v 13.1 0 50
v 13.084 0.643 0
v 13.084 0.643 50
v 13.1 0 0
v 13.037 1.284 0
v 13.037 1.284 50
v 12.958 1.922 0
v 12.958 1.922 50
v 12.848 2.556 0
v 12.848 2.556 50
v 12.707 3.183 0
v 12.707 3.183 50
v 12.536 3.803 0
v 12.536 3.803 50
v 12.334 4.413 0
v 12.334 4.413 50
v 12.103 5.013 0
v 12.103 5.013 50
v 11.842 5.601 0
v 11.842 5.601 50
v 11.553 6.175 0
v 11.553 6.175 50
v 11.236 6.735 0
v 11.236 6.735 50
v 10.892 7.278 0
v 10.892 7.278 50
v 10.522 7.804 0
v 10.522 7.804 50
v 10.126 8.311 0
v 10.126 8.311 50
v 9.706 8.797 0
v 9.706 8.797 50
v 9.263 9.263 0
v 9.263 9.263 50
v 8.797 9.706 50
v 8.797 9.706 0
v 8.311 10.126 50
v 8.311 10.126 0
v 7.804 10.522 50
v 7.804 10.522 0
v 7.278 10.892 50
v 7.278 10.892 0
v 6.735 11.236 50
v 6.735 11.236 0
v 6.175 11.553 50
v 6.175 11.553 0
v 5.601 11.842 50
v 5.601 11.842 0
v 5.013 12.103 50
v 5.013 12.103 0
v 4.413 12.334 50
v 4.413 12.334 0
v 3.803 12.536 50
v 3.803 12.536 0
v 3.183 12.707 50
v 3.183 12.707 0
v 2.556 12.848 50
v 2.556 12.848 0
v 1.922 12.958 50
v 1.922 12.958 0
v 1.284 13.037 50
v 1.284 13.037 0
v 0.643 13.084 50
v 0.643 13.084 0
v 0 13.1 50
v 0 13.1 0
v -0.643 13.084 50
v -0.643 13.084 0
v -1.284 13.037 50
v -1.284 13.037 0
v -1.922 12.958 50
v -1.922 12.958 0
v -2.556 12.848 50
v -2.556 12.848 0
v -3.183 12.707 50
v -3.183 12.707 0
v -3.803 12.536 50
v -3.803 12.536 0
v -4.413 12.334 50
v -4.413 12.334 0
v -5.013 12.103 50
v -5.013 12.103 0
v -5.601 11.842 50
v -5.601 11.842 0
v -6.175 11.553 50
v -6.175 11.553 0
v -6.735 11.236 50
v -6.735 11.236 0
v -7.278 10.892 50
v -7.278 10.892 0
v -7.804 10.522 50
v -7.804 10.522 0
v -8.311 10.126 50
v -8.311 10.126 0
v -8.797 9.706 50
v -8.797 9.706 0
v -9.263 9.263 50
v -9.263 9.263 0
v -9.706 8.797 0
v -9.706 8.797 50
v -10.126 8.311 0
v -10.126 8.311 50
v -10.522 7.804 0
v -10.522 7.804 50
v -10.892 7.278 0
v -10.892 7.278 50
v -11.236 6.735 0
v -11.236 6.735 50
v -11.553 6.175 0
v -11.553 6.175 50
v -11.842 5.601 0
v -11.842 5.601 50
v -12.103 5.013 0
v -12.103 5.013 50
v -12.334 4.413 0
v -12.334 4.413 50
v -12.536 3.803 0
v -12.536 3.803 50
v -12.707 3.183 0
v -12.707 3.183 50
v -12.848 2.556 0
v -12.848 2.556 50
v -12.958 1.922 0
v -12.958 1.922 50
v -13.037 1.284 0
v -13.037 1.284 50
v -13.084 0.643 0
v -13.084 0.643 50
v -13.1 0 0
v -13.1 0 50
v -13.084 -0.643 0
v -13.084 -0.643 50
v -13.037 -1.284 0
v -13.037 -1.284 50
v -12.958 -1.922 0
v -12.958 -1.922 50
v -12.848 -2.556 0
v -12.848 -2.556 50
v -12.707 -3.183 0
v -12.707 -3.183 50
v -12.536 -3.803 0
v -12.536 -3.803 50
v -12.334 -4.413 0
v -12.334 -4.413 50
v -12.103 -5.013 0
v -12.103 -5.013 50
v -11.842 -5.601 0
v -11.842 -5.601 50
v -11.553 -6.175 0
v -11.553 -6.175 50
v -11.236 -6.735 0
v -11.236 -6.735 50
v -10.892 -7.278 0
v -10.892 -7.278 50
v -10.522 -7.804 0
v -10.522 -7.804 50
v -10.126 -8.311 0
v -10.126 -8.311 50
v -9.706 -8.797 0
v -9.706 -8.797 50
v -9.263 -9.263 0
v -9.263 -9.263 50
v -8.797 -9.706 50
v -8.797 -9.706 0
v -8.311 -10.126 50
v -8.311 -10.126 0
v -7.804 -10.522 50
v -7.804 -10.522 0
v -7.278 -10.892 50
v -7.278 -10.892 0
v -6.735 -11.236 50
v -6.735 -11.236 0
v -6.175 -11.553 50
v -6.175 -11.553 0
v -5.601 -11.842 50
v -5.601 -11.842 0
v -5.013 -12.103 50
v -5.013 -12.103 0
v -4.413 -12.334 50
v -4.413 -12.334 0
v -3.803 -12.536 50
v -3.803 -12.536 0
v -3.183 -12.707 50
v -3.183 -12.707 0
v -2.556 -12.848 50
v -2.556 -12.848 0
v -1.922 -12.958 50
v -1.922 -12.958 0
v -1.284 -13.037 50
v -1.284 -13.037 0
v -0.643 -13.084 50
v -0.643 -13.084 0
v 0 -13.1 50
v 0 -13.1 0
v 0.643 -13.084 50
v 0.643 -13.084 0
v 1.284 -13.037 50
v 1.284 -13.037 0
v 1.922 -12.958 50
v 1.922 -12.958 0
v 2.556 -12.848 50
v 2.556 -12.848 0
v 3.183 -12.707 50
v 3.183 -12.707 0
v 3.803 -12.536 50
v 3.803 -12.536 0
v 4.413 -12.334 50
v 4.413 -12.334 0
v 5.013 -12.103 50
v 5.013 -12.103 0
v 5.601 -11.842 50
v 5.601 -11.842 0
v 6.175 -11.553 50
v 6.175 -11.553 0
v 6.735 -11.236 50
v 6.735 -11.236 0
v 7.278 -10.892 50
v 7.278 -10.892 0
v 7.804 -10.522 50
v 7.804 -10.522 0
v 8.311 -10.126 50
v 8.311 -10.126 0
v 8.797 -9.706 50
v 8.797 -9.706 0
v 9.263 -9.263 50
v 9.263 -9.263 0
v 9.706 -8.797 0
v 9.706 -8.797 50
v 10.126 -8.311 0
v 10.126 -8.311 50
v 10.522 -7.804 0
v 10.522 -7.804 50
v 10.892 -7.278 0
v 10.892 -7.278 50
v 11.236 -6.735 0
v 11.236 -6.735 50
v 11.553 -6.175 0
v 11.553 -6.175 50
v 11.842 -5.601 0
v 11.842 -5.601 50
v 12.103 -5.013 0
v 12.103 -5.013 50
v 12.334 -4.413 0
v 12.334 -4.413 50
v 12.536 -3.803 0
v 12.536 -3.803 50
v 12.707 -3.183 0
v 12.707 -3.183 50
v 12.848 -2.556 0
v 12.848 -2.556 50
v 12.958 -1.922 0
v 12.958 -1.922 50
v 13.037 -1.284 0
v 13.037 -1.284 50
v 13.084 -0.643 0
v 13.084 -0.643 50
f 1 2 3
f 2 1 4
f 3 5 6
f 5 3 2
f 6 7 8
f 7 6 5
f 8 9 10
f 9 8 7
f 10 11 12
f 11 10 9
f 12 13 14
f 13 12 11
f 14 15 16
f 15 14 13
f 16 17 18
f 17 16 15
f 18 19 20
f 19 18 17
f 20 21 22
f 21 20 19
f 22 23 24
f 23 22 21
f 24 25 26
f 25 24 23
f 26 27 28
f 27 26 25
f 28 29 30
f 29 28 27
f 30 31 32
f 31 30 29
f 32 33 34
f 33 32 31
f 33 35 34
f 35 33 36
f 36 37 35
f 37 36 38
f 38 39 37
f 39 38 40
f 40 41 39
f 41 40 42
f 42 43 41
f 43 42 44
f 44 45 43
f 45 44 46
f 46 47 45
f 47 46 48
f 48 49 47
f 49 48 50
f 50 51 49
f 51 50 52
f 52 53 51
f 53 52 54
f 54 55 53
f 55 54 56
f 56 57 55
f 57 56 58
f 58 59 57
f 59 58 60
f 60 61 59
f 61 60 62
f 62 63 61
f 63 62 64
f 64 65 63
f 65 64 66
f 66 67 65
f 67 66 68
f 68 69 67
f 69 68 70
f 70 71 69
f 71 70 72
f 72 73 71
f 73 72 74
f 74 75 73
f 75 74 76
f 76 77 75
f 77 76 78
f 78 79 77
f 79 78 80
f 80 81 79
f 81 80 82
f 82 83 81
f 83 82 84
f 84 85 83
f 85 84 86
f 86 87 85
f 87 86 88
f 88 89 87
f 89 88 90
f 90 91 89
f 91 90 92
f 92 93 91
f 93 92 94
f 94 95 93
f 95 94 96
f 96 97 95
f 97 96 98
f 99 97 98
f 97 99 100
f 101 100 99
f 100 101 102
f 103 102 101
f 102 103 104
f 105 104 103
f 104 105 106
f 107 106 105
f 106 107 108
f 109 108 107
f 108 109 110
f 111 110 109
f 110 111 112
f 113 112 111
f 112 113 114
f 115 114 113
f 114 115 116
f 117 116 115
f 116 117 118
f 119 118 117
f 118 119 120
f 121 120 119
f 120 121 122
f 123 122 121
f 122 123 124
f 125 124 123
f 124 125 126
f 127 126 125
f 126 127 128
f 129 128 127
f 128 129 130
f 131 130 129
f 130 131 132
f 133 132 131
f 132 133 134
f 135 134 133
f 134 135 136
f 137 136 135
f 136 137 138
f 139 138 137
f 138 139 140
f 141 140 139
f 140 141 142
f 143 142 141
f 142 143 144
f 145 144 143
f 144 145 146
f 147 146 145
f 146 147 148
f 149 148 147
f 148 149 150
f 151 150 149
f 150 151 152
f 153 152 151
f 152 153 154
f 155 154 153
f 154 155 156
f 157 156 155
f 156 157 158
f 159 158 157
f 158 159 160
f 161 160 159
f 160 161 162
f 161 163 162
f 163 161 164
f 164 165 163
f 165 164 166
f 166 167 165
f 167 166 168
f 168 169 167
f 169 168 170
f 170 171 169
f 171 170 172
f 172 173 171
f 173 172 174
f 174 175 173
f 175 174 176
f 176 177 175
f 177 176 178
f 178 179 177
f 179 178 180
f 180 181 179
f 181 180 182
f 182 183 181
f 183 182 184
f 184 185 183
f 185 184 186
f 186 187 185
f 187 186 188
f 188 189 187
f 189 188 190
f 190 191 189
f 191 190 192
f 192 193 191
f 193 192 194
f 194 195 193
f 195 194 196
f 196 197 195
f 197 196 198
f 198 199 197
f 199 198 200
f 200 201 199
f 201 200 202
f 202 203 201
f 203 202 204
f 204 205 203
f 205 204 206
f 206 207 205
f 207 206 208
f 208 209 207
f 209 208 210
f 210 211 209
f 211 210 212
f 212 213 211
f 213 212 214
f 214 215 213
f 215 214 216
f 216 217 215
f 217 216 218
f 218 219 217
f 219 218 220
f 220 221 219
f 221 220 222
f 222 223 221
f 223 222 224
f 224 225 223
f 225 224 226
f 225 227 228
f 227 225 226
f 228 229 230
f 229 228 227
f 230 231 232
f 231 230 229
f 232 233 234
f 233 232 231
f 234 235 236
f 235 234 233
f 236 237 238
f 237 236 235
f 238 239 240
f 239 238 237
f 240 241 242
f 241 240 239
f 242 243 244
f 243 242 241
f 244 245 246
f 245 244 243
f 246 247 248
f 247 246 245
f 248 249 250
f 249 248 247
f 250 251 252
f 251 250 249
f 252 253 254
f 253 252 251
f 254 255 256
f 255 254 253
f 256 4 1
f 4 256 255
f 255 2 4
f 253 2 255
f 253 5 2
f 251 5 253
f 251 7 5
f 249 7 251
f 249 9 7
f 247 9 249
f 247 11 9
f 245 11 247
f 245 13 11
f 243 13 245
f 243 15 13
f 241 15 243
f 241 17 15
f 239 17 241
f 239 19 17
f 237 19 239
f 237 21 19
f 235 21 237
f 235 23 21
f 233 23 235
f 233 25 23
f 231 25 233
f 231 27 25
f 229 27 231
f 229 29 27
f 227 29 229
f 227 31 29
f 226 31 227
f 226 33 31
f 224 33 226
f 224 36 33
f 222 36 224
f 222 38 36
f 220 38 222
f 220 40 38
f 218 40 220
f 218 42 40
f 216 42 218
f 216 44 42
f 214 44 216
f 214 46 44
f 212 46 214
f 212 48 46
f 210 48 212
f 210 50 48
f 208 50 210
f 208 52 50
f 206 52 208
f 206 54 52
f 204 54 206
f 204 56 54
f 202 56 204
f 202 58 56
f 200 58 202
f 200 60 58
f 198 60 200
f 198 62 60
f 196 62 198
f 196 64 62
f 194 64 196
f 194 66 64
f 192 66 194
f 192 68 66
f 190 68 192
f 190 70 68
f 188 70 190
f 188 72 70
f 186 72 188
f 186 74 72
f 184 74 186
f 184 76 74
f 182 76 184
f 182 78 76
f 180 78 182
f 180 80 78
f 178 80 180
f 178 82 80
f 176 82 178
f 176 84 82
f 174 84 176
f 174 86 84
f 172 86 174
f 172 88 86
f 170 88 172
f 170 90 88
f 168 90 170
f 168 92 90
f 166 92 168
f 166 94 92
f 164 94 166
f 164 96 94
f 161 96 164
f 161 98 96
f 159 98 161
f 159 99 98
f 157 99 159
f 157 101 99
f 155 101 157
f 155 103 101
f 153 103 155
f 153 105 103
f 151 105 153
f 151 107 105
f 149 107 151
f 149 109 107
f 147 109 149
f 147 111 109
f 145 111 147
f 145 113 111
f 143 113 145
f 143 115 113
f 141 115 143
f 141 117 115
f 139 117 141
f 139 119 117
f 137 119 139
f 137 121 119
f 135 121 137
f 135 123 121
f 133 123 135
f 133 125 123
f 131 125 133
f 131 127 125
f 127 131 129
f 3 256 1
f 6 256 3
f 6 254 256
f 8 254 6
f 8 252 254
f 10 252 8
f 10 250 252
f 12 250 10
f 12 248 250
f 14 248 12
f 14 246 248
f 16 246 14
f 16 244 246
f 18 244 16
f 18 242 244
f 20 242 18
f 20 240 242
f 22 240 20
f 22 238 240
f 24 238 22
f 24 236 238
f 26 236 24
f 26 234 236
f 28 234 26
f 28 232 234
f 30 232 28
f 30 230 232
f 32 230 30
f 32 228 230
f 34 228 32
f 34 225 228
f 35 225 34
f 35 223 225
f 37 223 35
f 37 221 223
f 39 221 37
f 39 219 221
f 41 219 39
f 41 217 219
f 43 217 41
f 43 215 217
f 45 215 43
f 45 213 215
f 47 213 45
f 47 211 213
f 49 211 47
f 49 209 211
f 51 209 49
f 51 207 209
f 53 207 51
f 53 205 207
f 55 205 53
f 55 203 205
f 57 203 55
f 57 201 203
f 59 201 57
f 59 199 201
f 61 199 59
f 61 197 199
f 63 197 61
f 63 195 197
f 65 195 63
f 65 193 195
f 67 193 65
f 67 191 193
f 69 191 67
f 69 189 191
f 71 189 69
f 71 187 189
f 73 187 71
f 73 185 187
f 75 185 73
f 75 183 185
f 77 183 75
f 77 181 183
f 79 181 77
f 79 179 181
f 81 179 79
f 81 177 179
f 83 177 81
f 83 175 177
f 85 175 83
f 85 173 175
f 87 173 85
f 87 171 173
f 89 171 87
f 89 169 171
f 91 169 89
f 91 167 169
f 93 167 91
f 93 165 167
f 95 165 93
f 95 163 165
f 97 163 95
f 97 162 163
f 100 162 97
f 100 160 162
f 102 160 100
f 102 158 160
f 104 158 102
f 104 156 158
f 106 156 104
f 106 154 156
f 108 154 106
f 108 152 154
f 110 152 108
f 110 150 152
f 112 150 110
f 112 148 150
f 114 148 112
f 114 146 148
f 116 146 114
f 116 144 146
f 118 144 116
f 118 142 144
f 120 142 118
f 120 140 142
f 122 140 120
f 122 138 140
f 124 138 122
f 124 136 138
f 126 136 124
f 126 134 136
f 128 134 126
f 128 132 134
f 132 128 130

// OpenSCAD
$fn = 128;

height = 50.0;      // mm
diameter = 26.2;    // mm

cylinder(h = height, d = diameter);
